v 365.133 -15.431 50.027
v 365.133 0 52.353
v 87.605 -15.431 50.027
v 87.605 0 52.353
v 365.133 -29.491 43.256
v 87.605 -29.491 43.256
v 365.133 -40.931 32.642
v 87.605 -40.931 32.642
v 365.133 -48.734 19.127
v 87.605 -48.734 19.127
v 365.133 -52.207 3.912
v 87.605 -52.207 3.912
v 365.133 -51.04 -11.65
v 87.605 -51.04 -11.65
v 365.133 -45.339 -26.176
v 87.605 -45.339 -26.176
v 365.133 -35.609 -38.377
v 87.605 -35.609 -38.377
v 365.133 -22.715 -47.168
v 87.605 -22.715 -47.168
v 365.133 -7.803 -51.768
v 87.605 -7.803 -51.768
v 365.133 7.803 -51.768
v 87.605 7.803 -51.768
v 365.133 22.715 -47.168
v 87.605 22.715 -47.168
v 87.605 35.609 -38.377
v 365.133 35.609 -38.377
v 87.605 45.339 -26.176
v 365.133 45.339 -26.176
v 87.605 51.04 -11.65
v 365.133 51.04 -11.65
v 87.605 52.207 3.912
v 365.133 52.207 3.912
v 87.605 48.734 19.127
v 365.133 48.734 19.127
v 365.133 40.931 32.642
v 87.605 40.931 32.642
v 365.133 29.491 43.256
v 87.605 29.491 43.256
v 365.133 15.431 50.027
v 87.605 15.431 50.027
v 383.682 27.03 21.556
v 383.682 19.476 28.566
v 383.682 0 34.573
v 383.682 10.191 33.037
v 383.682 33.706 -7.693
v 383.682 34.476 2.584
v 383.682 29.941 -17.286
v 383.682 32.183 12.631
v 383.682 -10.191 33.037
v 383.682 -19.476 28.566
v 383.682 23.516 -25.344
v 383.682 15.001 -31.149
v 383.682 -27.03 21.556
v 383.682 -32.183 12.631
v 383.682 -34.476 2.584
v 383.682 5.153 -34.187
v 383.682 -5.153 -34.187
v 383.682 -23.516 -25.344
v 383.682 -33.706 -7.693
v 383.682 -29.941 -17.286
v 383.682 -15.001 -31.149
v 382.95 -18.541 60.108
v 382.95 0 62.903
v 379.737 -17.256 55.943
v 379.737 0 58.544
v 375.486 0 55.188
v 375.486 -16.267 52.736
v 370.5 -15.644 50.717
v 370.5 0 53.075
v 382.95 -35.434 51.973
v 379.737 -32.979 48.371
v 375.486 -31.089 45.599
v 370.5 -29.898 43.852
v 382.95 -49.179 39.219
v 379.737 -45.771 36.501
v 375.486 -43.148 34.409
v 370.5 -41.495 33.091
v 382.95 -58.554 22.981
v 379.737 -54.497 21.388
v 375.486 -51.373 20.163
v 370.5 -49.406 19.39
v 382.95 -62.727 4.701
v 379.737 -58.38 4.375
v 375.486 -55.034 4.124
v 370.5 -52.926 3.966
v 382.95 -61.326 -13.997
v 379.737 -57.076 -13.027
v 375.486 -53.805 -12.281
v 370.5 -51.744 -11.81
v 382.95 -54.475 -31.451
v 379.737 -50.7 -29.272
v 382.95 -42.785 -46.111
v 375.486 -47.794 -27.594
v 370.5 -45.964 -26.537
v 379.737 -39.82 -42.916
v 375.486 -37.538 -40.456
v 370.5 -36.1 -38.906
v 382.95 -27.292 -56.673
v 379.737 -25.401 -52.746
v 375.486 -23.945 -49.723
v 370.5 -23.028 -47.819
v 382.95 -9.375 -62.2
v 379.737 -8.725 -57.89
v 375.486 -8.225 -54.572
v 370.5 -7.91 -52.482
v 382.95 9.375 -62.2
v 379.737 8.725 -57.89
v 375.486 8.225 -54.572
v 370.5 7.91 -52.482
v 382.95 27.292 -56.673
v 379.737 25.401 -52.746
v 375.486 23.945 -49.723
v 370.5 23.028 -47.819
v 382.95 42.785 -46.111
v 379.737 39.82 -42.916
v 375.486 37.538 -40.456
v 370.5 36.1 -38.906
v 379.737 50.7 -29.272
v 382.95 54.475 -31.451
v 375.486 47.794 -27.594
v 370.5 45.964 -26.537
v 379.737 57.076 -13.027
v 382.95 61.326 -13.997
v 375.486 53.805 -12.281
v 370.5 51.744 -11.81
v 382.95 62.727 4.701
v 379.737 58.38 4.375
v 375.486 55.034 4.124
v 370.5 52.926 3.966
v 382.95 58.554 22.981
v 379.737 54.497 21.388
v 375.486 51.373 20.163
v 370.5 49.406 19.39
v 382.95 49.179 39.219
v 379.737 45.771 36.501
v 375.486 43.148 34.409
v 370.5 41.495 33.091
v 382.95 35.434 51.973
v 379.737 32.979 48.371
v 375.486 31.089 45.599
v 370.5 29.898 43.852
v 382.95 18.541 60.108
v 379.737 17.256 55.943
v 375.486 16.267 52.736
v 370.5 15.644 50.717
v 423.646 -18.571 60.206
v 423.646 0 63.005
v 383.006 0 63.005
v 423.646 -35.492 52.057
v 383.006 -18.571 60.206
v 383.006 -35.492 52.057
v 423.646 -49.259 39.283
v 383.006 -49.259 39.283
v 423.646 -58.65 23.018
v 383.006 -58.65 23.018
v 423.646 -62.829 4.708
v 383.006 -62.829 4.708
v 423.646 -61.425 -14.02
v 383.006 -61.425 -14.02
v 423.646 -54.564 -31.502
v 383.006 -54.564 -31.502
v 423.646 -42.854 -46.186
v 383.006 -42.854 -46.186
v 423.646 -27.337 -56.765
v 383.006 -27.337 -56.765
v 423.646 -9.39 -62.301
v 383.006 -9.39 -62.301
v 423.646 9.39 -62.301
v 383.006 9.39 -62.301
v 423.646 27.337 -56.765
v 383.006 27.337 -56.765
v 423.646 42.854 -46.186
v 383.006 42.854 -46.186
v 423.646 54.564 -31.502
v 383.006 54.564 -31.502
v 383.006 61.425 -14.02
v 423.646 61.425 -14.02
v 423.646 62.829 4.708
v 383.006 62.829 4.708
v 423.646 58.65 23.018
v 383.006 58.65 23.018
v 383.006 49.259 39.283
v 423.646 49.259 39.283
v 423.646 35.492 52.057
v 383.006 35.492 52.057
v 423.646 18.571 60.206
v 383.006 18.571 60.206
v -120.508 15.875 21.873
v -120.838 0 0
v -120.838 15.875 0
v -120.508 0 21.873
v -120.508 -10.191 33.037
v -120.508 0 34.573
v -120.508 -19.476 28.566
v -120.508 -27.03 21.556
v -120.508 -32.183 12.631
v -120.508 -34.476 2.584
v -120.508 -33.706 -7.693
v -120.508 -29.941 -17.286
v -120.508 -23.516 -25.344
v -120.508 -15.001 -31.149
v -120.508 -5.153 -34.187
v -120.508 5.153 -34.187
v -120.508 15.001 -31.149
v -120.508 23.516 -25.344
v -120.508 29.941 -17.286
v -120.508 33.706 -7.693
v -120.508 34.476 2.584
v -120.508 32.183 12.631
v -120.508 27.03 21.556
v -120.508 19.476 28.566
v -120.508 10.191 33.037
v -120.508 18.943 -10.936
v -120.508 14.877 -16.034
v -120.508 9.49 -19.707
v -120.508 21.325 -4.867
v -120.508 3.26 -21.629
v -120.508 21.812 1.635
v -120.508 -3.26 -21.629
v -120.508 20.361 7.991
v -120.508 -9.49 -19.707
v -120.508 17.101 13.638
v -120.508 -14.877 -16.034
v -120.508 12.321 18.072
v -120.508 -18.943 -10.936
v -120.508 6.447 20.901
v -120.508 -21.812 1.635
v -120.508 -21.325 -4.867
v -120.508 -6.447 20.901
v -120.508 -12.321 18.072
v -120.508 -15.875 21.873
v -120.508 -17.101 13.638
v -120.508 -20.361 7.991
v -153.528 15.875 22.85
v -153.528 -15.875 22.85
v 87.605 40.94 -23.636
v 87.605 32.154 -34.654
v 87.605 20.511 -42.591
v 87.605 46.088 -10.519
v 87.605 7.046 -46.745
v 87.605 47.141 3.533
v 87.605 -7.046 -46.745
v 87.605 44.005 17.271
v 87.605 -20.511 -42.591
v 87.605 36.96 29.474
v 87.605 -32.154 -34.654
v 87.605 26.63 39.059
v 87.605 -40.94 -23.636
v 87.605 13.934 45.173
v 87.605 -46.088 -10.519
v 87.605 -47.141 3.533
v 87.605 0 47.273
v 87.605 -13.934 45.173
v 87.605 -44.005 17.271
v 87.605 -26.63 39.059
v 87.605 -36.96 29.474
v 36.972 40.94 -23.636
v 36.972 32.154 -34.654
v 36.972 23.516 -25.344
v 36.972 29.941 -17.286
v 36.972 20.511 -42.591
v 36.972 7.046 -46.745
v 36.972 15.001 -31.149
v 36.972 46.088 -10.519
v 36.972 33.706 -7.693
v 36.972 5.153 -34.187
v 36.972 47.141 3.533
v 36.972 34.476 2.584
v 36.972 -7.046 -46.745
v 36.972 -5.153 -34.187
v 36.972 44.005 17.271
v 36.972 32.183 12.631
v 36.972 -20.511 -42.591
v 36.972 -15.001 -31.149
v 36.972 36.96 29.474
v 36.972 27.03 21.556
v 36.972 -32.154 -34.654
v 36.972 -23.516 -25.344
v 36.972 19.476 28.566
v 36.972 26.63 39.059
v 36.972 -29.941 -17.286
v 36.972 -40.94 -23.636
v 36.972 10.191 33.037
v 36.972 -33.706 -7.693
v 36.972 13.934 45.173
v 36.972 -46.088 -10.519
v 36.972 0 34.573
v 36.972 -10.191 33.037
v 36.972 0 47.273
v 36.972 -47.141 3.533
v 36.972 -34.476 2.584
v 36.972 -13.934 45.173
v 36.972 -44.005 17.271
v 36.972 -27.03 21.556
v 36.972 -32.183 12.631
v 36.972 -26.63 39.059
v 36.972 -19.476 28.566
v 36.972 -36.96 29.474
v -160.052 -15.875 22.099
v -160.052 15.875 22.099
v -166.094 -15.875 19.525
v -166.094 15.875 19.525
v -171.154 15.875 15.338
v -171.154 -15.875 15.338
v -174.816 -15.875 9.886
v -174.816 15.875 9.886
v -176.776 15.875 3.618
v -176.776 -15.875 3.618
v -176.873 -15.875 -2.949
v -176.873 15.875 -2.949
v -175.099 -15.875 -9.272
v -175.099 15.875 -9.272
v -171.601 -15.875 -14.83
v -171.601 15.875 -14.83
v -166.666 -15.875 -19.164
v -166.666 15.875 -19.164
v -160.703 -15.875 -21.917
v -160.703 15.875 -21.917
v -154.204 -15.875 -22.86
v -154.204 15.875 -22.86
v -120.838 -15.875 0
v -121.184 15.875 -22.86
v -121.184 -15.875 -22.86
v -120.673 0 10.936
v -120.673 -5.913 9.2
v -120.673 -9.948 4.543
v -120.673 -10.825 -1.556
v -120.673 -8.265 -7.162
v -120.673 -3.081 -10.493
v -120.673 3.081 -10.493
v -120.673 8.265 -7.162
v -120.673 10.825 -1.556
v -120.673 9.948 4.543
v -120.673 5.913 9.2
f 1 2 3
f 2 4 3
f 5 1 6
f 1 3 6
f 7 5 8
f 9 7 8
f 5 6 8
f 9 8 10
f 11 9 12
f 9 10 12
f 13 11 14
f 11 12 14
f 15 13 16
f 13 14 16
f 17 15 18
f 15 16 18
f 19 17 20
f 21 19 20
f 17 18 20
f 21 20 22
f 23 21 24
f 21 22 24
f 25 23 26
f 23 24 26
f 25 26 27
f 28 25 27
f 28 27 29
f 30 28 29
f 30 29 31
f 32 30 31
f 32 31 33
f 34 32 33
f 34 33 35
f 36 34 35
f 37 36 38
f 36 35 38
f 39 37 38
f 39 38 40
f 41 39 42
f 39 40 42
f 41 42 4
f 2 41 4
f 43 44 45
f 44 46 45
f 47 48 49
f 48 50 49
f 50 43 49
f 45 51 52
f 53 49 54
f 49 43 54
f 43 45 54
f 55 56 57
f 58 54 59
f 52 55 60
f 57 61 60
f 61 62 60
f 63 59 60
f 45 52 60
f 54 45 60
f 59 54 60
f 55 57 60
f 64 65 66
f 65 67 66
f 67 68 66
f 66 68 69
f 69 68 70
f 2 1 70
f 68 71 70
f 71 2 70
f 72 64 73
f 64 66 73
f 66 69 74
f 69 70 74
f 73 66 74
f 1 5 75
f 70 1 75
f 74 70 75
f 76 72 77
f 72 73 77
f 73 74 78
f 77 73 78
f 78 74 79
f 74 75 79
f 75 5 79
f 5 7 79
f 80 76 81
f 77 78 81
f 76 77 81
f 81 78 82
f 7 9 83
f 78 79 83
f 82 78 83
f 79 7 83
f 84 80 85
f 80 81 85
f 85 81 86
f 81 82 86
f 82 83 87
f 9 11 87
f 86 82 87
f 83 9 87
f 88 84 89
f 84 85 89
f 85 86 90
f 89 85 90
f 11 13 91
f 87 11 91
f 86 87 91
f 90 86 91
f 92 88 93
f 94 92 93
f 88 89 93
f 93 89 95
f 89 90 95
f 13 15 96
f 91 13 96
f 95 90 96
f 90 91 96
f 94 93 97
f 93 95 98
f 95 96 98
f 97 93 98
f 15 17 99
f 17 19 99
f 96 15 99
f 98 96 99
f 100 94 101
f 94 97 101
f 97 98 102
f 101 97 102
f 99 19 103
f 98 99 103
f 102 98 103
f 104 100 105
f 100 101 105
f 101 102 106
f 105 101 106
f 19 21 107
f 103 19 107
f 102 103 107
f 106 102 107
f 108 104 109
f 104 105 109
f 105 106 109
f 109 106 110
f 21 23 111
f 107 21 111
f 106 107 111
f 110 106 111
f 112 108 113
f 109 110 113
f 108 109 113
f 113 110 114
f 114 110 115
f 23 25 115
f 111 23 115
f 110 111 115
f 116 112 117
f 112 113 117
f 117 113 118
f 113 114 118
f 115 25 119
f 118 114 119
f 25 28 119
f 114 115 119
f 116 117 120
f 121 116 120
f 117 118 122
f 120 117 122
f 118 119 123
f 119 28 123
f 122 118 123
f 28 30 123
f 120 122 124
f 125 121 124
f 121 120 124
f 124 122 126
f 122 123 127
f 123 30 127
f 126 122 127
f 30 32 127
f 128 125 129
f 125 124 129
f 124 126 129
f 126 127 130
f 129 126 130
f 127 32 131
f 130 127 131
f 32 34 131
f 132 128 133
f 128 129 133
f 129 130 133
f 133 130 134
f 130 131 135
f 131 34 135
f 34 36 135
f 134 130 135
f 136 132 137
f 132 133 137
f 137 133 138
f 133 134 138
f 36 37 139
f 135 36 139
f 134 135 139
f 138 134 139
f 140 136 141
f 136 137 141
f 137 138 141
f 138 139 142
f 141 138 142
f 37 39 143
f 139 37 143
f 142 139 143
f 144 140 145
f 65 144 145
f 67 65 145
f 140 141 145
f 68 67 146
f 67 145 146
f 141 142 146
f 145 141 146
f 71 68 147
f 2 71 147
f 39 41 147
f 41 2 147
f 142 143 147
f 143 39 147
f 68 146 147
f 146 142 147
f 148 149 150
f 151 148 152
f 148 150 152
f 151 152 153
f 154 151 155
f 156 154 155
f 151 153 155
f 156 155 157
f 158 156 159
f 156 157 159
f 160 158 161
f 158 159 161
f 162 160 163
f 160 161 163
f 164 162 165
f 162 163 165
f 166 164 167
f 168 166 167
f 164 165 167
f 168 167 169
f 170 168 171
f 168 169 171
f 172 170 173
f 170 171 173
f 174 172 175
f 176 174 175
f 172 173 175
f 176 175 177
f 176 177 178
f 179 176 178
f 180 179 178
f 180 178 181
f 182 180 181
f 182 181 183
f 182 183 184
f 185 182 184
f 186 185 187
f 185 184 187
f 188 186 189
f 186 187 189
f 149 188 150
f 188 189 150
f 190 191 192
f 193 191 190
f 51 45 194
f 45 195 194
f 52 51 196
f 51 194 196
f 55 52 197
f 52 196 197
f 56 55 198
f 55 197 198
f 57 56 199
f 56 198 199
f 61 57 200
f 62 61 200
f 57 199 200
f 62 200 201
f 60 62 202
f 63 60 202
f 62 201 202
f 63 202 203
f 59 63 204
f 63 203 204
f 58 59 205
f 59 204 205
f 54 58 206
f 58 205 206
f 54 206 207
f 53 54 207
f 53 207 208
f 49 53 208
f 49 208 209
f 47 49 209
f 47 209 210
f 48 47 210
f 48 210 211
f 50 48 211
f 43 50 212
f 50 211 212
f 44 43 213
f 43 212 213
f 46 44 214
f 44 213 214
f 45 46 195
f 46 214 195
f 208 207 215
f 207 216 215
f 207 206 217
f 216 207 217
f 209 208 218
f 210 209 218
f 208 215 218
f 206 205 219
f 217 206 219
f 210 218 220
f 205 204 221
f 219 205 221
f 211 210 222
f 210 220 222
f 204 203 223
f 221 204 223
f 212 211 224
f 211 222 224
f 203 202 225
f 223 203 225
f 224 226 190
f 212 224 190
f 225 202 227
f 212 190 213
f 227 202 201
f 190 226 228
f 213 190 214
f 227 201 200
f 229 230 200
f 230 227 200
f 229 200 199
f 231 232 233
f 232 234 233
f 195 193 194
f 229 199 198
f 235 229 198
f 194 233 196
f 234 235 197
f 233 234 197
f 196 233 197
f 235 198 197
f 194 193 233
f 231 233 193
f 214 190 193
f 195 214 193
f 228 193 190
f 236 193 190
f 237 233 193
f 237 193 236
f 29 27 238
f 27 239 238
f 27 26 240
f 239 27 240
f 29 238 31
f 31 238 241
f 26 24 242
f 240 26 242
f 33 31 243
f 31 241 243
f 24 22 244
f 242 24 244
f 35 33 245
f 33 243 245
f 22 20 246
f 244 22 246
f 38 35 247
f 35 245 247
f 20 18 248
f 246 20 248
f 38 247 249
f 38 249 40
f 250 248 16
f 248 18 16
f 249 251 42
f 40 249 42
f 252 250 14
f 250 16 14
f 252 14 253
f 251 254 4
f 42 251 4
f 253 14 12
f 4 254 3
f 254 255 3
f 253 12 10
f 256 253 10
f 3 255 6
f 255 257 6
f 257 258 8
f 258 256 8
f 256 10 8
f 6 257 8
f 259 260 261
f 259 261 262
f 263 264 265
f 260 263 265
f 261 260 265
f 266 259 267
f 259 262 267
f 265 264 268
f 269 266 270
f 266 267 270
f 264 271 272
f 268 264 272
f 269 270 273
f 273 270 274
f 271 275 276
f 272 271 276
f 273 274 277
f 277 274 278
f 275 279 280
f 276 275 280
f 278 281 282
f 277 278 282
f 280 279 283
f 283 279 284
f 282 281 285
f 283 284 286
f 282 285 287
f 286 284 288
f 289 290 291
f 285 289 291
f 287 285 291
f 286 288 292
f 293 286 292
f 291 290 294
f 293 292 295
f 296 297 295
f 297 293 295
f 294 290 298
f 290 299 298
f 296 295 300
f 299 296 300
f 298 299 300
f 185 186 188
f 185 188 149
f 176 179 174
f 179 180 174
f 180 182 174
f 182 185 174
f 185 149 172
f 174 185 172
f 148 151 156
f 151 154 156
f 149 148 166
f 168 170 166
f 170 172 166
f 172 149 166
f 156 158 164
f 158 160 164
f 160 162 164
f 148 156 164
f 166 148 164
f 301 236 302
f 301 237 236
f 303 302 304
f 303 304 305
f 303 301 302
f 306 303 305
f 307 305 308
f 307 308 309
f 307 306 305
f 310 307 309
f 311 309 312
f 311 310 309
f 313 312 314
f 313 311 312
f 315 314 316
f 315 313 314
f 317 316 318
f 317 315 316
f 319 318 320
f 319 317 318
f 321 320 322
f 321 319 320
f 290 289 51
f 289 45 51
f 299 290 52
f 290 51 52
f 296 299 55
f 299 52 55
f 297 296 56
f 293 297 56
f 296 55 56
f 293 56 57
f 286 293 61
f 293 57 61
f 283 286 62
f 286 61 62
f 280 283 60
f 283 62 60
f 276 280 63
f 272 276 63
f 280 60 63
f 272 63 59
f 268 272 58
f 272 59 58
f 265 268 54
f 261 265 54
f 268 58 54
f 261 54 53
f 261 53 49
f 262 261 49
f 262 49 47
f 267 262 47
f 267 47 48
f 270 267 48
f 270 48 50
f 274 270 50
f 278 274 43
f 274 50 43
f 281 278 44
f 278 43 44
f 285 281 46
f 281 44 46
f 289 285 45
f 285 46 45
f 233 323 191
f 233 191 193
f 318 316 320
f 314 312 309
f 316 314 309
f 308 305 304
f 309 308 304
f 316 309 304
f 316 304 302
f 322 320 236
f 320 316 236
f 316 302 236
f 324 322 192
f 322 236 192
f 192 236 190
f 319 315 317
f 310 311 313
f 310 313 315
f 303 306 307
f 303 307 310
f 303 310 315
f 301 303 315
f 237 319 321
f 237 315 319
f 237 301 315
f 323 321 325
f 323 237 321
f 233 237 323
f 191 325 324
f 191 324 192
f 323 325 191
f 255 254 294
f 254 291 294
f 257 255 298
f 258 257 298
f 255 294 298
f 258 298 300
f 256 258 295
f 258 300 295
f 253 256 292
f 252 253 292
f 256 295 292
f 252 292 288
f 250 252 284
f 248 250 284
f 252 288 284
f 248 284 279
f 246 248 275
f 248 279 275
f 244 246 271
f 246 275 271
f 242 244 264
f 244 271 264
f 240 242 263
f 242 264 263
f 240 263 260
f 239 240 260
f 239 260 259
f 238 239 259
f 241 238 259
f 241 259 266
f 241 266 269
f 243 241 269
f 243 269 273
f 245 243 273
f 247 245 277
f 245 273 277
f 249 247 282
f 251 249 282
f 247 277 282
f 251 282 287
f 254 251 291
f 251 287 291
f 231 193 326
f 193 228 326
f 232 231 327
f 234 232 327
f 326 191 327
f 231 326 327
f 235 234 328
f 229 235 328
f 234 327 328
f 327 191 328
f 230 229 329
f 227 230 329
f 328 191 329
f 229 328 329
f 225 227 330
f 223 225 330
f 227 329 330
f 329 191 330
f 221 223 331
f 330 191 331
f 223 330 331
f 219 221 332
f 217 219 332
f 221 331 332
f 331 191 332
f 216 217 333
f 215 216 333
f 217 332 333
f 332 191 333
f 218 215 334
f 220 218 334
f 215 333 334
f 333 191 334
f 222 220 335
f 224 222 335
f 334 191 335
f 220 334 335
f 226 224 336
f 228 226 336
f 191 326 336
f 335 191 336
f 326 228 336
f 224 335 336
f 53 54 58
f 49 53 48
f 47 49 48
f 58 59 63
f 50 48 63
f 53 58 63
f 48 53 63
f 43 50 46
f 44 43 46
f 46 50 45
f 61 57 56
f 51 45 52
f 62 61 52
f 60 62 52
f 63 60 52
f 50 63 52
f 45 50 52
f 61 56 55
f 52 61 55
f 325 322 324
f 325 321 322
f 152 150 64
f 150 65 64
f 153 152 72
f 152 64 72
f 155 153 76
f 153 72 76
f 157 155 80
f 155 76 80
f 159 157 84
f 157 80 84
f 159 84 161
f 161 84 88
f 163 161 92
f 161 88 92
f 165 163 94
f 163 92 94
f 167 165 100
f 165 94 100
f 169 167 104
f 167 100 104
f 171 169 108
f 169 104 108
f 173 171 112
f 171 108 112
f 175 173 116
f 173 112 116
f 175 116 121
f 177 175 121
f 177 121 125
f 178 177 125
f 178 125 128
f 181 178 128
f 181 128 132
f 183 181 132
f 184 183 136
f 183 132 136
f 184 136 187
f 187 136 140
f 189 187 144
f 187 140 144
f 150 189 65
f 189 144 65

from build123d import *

# Parameters (mm, degrees)
F3_DEPTH = 15.875


with BuildPart() as f1:
    # F0 (on Front) → F1 (revolve)
    with BuildSketch(Plane.XZ):
        with BuildLine():
            Line((383.68211, 34.572985), (383.68211, 0))
            Line((383.68211, 0), (423.646011, 0))
            Line((423.646011, 0), (423.646011, 22.86))
            Line((423.646011, 22.86), (423.646011, 63.004903))
            Line((423.646011, 63.004903), (383.006011, 63.004903))
            Line((383.006011, 63.004903), (382.949919, 62.902614))
            ThreePointArc((382.949919, 62.902614), (375.485991, 55.188187), (365.133009, 52.352985))
            Line((365.133009, 52.352985), (87.604752, 52.352985))
            Line((87.604752, 52.352985), (87.604752, 47.272985))
            Line((87.604752, 47.272985), (44.59211, 47.272985))
            Line((44.59211, 47.272985), (36.97211, 47.272985))
            Line((36.97211, 47.272985), (36.97211, 34.572985))
            Line((36.97211, 34.572985), (383.68211, 34.572985))
        make_face()
    revolve(axis=Axis((179.978765, 0, 0), (1, 0, 0)))


with BuildPart() as f2:
    # F0 (on Front) → F2 (revolve)
    with BuildSketch(Plane.XZ):
        Polygon((-120.50789, 21.872985), (-120.838481, 0), (383.68211, 0), (383.68211, 34.572985), (36.97211, 34.572985), (-120.50789, 34.572985), align=None)
    revolve(axis=Axis((179.978765, 0, 0), (1, 0, 0)))

    # F0 (on Front) → F3 (join, symmetric)
    with BuildSketch(Plane.XZ):
        with BuildLine():
            ThreePointArc((-153.52789, 22.85), (-137.802233, 15.92363), (-131.343989, 0))
            Line((-131.343989, 0), (-120.838481, 0))
            Line((-120.838481, 0), (-120.50789, 21.872985))
            Line((-120.50789, 21.872985), (-153.52789, 22.85))
        make_face()
        with BuildLine():
            Line((-120.838481, 0), (-131.343989, 0))
            ThreePointArc((-131.343989, 0), (-138.039528, -16.164461), (-154.203989, -22.86))
            Line((-154.203989, -22.86), (-121.183989, -22.86))
            Line((-121.183989, -22.86), (-120.838481, 0))
        make_face()
        with BuildLine():
            ThreePointArc((-154.203989, -22.86), (-138.039528, -16.164461), (-131.343989, 0))
            Line((-131.343989, 0), (-154.203989, 0))
            Line((-154.203989, 0), (-154.203989, -22.86))
        make_face()
        with BuildLine():
            Line((-154.203989, 0), (-131.343989, 0))
            ThreePointArc((-131.343989, 0), (-137.802233, 15.92363), (-153.52789, 22.85))
            ThreePointArc((-153.52789, 22.85), (-177.061489, 0.338086), (-154.203989, -22.86))
            Line((-154.203989, -22.86), (-154.203989, 0))
        make_face()
    extrude(amount=F3_DEPTH, both=True)


solid = Compound([f1.part, f2.part])
